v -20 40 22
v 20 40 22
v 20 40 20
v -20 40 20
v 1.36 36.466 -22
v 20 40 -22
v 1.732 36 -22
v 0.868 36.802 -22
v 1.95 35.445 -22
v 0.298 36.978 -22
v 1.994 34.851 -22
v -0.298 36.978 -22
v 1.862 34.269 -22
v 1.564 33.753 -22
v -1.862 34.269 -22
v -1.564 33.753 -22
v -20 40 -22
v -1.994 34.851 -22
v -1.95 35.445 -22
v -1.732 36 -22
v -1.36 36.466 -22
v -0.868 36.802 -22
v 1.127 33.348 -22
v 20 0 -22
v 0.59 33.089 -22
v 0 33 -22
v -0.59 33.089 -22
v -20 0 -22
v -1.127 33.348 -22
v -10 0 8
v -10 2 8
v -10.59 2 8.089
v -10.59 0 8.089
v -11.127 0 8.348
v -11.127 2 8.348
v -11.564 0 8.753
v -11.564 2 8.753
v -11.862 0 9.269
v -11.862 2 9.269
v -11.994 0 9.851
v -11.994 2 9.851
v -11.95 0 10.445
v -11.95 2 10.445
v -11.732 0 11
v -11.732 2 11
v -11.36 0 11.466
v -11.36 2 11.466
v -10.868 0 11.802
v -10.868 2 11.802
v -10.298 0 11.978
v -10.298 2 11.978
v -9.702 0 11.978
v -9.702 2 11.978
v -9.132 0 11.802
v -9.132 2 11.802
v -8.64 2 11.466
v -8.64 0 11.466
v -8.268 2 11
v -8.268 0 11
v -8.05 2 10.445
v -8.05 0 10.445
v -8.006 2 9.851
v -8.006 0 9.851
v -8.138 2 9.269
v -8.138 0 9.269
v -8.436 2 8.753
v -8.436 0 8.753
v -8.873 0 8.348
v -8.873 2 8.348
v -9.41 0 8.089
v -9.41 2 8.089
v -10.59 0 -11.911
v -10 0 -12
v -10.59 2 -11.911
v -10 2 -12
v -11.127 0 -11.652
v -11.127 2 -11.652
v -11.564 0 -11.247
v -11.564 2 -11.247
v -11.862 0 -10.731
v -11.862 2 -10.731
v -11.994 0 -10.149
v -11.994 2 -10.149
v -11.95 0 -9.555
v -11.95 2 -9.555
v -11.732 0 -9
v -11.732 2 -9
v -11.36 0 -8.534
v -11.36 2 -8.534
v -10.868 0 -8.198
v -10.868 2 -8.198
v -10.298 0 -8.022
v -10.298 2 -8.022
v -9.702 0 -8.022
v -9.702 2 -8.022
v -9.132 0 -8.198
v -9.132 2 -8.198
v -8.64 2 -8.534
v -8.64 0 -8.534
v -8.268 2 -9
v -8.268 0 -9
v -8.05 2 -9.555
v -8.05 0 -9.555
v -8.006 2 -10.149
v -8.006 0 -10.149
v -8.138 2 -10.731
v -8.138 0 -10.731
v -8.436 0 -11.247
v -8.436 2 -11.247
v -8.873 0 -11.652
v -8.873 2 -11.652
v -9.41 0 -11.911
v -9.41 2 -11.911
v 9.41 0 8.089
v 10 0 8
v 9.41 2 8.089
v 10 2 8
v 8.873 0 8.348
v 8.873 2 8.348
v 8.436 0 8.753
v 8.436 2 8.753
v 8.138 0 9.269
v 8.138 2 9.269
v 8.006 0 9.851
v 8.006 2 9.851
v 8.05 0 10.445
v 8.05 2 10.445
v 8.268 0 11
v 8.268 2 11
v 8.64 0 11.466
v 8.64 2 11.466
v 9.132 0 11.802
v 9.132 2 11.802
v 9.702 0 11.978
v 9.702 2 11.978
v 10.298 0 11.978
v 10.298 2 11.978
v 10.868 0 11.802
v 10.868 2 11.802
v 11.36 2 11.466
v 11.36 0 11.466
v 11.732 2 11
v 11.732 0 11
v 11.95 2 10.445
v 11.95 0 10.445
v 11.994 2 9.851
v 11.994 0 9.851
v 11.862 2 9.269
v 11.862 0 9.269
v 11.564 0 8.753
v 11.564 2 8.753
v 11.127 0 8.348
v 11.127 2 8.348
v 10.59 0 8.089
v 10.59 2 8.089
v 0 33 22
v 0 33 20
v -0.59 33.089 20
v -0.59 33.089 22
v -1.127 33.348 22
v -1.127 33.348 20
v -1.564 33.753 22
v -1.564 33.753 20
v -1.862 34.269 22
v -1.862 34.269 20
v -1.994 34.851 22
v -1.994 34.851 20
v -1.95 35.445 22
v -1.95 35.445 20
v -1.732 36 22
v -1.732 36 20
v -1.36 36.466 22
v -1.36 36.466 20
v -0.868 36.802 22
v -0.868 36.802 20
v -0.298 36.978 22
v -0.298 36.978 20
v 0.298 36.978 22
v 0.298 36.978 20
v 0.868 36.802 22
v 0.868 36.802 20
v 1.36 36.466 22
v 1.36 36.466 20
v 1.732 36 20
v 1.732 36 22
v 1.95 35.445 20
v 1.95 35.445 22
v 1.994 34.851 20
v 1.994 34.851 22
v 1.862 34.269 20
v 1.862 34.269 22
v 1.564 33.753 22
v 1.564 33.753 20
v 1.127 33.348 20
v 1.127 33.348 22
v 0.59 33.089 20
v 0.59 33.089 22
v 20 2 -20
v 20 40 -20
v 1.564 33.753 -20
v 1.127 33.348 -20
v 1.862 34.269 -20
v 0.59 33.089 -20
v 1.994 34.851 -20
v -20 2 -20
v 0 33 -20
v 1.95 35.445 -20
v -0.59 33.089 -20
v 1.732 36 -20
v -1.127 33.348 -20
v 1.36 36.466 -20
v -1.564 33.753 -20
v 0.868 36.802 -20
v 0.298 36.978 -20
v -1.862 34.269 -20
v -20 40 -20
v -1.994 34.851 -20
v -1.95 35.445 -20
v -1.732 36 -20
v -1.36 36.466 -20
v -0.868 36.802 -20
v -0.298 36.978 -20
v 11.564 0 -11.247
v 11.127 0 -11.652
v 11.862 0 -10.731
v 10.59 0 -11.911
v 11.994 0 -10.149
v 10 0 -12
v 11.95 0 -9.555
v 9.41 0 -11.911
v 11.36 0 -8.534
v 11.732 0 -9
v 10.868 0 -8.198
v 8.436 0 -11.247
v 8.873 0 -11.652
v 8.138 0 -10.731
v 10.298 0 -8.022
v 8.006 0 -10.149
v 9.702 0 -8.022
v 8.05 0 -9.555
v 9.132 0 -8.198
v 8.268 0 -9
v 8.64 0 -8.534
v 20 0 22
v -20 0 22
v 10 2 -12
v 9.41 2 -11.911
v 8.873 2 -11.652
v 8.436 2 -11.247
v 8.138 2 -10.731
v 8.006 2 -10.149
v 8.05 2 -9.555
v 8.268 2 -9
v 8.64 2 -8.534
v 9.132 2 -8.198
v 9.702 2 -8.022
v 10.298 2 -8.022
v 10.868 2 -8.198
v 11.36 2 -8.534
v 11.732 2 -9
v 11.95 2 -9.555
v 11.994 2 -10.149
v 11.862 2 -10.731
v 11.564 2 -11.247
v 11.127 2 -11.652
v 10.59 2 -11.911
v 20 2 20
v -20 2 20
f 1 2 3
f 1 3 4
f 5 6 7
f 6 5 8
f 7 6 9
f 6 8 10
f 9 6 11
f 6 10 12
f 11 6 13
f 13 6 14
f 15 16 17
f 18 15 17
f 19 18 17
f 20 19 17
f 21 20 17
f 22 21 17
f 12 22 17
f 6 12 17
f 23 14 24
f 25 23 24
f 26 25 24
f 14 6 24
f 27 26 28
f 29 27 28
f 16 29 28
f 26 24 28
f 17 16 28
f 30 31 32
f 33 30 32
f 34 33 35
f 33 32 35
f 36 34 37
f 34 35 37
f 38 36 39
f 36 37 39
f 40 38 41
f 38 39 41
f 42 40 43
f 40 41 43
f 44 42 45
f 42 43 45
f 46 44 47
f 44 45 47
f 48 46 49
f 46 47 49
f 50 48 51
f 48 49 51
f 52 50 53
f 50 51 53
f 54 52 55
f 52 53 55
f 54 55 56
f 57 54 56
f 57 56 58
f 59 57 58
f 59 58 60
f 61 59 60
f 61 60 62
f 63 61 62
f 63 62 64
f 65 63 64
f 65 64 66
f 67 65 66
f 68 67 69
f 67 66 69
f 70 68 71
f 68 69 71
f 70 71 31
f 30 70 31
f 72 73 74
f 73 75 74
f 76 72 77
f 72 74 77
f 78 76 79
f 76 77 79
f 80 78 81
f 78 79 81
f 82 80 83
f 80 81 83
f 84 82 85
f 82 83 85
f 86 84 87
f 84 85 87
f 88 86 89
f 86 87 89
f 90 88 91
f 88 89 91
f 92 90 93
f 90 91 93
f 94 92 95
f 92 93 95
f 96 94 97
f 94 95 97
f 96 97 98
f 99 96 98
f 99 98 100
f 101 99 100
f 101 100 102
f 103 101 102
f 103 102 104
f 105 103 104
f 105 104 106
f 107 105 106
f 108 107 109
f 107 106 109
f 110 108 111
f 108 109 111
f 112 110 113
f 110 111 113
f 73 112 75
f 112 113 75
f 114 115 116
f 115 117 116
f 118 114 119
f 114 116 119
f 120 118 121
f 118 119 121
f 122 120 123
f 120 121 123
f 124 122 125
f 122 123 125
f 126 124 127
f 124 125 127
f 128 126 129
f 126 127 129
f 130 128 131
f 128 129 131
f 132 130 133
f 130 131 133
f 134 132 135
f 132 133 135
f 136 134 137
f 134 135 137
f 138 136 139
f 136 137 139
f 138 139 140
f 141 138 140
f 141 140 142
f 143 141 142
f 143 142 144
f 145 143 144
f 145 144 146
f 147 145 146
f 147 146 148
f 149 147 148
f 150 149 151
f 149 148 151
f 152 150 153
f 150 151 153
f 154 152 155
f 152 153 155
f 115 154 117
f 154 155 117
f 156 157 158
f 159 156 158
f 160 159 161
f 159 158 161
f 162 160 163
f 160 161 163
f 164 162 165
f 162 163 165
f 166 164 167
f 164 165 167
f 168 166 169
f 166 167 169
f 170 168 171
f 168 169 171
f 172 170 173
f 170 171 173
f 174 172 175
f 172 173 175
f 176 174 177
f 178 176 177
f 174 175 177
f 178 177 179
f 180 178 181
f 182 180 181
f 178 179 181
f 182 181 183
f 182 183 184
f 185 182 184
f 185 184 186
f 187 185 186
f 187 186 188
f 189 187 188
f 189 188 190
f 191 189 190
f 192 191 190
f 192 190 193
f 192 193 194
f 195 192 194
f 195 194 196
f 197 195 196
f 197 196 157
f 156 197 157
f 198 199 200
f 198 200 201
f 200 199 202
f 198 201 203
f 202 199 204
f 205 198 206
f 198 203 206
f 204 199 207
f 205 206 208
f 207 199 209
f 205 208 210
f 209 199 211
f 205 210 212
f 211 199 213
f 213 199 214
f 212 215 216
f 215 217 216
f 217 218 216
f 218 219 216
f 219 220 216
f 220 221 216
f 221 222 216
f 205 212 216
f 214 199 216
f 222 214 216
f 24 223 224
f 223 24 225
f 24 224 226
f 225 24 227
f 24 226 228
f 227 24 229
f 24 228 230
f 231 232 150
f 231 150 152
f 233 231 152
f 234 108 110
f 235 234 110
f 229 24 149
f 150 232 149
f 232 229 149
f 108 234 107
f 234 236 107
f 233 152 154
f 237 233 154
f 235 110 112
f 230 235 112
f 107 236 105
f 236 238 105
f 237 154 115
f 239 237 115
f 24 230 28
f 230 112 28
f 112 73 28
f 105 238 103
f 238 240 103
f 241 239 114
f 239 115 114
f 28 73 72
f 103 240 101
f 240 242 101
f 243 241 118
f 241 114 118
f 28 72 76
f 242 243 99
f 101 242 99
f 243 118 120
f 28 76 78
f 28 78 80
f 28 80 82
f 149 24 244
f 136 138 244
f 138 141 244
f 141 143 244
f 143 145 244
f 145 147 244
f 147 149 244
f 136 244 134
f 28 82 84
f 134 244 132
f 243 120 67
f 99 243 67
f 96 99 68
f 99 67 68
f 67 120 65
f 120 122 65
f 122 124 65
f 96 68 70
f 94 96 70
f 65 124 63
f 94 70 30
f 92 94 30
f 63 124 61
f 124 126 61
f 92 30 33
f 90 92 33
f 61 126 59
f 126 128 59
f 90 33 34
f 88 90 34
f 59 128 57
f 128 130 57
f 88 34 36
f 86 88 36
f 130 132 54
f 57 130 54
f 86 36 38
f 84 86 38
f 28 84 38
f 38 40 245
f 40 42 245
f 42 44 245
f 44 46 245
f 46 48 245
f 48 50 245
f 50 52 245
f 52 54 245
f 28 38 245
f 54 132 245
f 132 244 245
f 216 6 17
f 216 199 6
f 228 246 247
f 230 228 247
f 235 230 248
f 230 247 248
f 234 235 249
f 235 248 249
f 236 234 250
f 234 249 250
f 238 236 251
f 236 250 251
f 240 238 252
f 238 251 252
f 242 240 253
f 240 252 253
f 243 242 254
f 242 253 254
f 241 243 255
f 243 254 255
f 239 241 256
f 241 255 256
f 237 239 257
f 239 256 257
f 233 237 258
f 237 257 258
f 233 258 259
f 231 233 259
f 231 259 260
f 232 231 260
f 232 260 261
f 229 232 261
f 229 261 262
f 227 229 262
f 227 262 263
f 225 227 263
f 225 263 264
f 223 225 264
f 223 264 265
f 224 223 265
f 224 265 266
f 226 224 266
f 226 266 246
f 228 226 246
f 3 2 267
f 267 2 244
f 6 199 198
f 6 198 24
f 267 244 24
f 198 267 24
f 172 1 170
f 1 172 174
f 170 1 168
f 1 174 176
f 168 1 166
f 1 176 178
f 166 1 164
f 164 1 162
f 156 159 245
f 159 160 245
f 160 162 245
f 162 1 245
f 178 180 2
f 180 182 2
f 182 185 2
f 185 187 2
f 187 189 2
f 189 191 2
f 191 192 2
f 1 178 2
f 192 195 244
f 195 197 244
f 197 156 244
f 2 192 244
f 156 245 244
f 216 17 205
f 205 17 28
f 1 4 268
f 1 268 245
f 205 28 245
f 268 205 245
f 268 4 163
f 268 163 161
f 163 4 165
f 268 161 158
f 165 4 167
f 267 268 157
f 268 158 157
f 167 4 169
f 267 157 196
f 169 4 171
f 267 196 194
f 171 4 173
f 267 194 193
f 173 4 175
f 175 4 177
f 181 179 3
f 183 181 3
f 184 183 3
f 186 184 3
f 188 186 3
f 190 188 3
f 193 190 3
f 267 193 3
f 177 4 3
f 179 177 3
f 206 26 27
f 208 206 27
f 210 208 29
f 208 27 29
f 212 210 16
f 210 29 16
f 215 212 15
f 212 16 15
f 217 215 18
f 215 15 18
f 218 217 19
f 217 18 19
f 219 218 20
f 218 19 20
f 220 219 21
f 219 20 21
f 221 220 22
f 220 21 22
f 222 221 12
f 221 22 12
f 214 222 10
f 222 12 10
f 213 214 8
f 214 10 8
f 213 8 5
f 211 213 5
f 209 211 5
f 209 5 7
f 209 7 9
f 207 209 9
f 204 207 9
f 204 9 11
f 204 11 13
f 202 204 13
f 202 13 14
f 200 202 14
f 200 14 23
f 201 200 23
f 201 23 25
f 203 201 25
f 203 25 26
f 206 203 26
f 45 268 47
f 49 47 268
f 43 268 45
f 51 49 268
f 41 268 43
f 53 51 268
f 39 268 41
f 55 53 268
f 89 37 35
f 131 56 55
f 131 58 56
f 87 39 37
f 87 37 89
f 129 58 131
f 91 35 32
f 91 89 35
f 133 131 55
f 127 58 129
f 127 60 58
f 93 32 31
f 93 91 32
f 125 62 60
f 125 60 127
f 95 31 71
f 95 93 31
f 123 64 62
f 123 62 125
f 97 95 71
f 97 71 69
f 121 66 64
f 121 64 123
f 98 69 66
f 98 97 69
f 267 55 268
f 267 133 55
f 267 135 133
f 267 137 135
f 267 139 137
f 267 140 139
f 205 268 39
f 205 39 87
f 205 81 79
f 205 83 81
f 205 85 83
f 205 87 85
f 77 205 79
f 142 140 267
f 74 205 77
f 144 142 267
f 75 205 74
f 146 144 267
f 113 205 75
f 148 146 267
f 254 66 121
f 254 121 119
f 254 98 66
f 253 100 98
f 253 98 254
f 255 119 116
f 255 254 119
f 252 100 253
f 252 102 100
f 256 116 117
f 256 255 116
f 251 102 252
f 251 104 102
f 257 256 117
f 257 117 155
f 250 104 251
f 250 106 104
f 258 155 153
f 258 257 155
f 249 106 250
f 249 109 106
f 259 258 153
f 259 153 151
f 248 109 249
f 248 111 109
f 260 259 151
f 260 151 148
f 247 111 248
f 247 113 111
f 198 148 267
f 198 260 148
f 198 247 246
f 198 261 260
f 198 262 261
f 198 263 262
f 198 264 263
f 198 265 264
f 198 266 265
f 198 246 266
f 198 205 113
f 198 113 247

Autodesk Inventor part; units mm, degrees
ref_plane "YZ Plane" through (0, 0, 0) normal (1, 0, 0) x (0, 1, 0)
ref_plane "XZ Plane" through (0, 0, 0) normal (0, 1, 0) x (-1, 0, 0)
ref_plane "XY Plane" through (0, 0, 0) normal (0, 0, 1) x (1, 0, 0)
sketch "スケッチ1" plane through (0, 0, 0) normal (0, 1, 0) x (-1, 0, 0)
  line L0 (20, 22) -> (-20, 22)
  line L1 (-20, 22) -> (-20, -22)
  line L2 (-20, -22) -> (20, -22)
  line L3 (20, -22) -> (20, 22)
  line L4 (20, 22) -> (-20, -22) construction
  line L5 (-20, 22) -> (20, -22) construction
  point P0 (0, 0)
  dimension "d0" = 40
  dimension "d1" = 44
extrude "押し出し1" add sketch "スケッチ1" along normal blind 40
sketch "スケッチ2" plane through (0, 40, 0) normal (0, 1, 0) x (1, 0, 0)
  line L0 (-20, -20) -> (20, -20)
  line L1 (20, -20) -> (20, 20)
  line L2 (20, 20) -> (-20, 20)
  line L3 (-20, 20) -> (-20, -20)
  line L4 (-20, -20) -> (20, 20) construction
  line L5 (20, -20) -> (-20, 20) construction
  point P0 (0, 0)
  dimension "d4" = 40
  dimension "d5" = 40
extrude "押し出し2" cut sketch "スケッチ2" against normal blind 38
sketch "スケッチ3" plane through (0, 0, 0) normal (0, -1, 0) x (1, 0, 0)
  line L0 (-20, -22) -> (-20, 22) projected
  line L1 (-20, 22) -> (20, 22) projected
  point P0 (0, 0)
  point P1 (-10, 10)
  point P2 (10, 10)
  point P3 (-10, -10)
  point P4 (10, -10)
  dimension "d8" = 10
  dimension "d9" = 12
  dimension "d12" = 20
  dimension "d15" = 20
hole "穴1" at (-10, 0, 10) at (10, 0, 10) at (-10, 0, -10) at (10, 0, -10) direction (0, 1, 0) diameter 4 end through all
sketch "スケッチ4" plane through (-20, 0, 22) normal (0, 0, 1) x (1, 0, 0)
  line L0 (0, 0) -> (0, 40) projected
  point P0 (20, 0)
  point P1 (20, 35)
  dimension "d25" = 35
  dimension "d26" = 20
hole "穴2" at (0, 35, 22) direction (0, 0, -1) diameter 4 end through all
properties part number "blaket_2"
